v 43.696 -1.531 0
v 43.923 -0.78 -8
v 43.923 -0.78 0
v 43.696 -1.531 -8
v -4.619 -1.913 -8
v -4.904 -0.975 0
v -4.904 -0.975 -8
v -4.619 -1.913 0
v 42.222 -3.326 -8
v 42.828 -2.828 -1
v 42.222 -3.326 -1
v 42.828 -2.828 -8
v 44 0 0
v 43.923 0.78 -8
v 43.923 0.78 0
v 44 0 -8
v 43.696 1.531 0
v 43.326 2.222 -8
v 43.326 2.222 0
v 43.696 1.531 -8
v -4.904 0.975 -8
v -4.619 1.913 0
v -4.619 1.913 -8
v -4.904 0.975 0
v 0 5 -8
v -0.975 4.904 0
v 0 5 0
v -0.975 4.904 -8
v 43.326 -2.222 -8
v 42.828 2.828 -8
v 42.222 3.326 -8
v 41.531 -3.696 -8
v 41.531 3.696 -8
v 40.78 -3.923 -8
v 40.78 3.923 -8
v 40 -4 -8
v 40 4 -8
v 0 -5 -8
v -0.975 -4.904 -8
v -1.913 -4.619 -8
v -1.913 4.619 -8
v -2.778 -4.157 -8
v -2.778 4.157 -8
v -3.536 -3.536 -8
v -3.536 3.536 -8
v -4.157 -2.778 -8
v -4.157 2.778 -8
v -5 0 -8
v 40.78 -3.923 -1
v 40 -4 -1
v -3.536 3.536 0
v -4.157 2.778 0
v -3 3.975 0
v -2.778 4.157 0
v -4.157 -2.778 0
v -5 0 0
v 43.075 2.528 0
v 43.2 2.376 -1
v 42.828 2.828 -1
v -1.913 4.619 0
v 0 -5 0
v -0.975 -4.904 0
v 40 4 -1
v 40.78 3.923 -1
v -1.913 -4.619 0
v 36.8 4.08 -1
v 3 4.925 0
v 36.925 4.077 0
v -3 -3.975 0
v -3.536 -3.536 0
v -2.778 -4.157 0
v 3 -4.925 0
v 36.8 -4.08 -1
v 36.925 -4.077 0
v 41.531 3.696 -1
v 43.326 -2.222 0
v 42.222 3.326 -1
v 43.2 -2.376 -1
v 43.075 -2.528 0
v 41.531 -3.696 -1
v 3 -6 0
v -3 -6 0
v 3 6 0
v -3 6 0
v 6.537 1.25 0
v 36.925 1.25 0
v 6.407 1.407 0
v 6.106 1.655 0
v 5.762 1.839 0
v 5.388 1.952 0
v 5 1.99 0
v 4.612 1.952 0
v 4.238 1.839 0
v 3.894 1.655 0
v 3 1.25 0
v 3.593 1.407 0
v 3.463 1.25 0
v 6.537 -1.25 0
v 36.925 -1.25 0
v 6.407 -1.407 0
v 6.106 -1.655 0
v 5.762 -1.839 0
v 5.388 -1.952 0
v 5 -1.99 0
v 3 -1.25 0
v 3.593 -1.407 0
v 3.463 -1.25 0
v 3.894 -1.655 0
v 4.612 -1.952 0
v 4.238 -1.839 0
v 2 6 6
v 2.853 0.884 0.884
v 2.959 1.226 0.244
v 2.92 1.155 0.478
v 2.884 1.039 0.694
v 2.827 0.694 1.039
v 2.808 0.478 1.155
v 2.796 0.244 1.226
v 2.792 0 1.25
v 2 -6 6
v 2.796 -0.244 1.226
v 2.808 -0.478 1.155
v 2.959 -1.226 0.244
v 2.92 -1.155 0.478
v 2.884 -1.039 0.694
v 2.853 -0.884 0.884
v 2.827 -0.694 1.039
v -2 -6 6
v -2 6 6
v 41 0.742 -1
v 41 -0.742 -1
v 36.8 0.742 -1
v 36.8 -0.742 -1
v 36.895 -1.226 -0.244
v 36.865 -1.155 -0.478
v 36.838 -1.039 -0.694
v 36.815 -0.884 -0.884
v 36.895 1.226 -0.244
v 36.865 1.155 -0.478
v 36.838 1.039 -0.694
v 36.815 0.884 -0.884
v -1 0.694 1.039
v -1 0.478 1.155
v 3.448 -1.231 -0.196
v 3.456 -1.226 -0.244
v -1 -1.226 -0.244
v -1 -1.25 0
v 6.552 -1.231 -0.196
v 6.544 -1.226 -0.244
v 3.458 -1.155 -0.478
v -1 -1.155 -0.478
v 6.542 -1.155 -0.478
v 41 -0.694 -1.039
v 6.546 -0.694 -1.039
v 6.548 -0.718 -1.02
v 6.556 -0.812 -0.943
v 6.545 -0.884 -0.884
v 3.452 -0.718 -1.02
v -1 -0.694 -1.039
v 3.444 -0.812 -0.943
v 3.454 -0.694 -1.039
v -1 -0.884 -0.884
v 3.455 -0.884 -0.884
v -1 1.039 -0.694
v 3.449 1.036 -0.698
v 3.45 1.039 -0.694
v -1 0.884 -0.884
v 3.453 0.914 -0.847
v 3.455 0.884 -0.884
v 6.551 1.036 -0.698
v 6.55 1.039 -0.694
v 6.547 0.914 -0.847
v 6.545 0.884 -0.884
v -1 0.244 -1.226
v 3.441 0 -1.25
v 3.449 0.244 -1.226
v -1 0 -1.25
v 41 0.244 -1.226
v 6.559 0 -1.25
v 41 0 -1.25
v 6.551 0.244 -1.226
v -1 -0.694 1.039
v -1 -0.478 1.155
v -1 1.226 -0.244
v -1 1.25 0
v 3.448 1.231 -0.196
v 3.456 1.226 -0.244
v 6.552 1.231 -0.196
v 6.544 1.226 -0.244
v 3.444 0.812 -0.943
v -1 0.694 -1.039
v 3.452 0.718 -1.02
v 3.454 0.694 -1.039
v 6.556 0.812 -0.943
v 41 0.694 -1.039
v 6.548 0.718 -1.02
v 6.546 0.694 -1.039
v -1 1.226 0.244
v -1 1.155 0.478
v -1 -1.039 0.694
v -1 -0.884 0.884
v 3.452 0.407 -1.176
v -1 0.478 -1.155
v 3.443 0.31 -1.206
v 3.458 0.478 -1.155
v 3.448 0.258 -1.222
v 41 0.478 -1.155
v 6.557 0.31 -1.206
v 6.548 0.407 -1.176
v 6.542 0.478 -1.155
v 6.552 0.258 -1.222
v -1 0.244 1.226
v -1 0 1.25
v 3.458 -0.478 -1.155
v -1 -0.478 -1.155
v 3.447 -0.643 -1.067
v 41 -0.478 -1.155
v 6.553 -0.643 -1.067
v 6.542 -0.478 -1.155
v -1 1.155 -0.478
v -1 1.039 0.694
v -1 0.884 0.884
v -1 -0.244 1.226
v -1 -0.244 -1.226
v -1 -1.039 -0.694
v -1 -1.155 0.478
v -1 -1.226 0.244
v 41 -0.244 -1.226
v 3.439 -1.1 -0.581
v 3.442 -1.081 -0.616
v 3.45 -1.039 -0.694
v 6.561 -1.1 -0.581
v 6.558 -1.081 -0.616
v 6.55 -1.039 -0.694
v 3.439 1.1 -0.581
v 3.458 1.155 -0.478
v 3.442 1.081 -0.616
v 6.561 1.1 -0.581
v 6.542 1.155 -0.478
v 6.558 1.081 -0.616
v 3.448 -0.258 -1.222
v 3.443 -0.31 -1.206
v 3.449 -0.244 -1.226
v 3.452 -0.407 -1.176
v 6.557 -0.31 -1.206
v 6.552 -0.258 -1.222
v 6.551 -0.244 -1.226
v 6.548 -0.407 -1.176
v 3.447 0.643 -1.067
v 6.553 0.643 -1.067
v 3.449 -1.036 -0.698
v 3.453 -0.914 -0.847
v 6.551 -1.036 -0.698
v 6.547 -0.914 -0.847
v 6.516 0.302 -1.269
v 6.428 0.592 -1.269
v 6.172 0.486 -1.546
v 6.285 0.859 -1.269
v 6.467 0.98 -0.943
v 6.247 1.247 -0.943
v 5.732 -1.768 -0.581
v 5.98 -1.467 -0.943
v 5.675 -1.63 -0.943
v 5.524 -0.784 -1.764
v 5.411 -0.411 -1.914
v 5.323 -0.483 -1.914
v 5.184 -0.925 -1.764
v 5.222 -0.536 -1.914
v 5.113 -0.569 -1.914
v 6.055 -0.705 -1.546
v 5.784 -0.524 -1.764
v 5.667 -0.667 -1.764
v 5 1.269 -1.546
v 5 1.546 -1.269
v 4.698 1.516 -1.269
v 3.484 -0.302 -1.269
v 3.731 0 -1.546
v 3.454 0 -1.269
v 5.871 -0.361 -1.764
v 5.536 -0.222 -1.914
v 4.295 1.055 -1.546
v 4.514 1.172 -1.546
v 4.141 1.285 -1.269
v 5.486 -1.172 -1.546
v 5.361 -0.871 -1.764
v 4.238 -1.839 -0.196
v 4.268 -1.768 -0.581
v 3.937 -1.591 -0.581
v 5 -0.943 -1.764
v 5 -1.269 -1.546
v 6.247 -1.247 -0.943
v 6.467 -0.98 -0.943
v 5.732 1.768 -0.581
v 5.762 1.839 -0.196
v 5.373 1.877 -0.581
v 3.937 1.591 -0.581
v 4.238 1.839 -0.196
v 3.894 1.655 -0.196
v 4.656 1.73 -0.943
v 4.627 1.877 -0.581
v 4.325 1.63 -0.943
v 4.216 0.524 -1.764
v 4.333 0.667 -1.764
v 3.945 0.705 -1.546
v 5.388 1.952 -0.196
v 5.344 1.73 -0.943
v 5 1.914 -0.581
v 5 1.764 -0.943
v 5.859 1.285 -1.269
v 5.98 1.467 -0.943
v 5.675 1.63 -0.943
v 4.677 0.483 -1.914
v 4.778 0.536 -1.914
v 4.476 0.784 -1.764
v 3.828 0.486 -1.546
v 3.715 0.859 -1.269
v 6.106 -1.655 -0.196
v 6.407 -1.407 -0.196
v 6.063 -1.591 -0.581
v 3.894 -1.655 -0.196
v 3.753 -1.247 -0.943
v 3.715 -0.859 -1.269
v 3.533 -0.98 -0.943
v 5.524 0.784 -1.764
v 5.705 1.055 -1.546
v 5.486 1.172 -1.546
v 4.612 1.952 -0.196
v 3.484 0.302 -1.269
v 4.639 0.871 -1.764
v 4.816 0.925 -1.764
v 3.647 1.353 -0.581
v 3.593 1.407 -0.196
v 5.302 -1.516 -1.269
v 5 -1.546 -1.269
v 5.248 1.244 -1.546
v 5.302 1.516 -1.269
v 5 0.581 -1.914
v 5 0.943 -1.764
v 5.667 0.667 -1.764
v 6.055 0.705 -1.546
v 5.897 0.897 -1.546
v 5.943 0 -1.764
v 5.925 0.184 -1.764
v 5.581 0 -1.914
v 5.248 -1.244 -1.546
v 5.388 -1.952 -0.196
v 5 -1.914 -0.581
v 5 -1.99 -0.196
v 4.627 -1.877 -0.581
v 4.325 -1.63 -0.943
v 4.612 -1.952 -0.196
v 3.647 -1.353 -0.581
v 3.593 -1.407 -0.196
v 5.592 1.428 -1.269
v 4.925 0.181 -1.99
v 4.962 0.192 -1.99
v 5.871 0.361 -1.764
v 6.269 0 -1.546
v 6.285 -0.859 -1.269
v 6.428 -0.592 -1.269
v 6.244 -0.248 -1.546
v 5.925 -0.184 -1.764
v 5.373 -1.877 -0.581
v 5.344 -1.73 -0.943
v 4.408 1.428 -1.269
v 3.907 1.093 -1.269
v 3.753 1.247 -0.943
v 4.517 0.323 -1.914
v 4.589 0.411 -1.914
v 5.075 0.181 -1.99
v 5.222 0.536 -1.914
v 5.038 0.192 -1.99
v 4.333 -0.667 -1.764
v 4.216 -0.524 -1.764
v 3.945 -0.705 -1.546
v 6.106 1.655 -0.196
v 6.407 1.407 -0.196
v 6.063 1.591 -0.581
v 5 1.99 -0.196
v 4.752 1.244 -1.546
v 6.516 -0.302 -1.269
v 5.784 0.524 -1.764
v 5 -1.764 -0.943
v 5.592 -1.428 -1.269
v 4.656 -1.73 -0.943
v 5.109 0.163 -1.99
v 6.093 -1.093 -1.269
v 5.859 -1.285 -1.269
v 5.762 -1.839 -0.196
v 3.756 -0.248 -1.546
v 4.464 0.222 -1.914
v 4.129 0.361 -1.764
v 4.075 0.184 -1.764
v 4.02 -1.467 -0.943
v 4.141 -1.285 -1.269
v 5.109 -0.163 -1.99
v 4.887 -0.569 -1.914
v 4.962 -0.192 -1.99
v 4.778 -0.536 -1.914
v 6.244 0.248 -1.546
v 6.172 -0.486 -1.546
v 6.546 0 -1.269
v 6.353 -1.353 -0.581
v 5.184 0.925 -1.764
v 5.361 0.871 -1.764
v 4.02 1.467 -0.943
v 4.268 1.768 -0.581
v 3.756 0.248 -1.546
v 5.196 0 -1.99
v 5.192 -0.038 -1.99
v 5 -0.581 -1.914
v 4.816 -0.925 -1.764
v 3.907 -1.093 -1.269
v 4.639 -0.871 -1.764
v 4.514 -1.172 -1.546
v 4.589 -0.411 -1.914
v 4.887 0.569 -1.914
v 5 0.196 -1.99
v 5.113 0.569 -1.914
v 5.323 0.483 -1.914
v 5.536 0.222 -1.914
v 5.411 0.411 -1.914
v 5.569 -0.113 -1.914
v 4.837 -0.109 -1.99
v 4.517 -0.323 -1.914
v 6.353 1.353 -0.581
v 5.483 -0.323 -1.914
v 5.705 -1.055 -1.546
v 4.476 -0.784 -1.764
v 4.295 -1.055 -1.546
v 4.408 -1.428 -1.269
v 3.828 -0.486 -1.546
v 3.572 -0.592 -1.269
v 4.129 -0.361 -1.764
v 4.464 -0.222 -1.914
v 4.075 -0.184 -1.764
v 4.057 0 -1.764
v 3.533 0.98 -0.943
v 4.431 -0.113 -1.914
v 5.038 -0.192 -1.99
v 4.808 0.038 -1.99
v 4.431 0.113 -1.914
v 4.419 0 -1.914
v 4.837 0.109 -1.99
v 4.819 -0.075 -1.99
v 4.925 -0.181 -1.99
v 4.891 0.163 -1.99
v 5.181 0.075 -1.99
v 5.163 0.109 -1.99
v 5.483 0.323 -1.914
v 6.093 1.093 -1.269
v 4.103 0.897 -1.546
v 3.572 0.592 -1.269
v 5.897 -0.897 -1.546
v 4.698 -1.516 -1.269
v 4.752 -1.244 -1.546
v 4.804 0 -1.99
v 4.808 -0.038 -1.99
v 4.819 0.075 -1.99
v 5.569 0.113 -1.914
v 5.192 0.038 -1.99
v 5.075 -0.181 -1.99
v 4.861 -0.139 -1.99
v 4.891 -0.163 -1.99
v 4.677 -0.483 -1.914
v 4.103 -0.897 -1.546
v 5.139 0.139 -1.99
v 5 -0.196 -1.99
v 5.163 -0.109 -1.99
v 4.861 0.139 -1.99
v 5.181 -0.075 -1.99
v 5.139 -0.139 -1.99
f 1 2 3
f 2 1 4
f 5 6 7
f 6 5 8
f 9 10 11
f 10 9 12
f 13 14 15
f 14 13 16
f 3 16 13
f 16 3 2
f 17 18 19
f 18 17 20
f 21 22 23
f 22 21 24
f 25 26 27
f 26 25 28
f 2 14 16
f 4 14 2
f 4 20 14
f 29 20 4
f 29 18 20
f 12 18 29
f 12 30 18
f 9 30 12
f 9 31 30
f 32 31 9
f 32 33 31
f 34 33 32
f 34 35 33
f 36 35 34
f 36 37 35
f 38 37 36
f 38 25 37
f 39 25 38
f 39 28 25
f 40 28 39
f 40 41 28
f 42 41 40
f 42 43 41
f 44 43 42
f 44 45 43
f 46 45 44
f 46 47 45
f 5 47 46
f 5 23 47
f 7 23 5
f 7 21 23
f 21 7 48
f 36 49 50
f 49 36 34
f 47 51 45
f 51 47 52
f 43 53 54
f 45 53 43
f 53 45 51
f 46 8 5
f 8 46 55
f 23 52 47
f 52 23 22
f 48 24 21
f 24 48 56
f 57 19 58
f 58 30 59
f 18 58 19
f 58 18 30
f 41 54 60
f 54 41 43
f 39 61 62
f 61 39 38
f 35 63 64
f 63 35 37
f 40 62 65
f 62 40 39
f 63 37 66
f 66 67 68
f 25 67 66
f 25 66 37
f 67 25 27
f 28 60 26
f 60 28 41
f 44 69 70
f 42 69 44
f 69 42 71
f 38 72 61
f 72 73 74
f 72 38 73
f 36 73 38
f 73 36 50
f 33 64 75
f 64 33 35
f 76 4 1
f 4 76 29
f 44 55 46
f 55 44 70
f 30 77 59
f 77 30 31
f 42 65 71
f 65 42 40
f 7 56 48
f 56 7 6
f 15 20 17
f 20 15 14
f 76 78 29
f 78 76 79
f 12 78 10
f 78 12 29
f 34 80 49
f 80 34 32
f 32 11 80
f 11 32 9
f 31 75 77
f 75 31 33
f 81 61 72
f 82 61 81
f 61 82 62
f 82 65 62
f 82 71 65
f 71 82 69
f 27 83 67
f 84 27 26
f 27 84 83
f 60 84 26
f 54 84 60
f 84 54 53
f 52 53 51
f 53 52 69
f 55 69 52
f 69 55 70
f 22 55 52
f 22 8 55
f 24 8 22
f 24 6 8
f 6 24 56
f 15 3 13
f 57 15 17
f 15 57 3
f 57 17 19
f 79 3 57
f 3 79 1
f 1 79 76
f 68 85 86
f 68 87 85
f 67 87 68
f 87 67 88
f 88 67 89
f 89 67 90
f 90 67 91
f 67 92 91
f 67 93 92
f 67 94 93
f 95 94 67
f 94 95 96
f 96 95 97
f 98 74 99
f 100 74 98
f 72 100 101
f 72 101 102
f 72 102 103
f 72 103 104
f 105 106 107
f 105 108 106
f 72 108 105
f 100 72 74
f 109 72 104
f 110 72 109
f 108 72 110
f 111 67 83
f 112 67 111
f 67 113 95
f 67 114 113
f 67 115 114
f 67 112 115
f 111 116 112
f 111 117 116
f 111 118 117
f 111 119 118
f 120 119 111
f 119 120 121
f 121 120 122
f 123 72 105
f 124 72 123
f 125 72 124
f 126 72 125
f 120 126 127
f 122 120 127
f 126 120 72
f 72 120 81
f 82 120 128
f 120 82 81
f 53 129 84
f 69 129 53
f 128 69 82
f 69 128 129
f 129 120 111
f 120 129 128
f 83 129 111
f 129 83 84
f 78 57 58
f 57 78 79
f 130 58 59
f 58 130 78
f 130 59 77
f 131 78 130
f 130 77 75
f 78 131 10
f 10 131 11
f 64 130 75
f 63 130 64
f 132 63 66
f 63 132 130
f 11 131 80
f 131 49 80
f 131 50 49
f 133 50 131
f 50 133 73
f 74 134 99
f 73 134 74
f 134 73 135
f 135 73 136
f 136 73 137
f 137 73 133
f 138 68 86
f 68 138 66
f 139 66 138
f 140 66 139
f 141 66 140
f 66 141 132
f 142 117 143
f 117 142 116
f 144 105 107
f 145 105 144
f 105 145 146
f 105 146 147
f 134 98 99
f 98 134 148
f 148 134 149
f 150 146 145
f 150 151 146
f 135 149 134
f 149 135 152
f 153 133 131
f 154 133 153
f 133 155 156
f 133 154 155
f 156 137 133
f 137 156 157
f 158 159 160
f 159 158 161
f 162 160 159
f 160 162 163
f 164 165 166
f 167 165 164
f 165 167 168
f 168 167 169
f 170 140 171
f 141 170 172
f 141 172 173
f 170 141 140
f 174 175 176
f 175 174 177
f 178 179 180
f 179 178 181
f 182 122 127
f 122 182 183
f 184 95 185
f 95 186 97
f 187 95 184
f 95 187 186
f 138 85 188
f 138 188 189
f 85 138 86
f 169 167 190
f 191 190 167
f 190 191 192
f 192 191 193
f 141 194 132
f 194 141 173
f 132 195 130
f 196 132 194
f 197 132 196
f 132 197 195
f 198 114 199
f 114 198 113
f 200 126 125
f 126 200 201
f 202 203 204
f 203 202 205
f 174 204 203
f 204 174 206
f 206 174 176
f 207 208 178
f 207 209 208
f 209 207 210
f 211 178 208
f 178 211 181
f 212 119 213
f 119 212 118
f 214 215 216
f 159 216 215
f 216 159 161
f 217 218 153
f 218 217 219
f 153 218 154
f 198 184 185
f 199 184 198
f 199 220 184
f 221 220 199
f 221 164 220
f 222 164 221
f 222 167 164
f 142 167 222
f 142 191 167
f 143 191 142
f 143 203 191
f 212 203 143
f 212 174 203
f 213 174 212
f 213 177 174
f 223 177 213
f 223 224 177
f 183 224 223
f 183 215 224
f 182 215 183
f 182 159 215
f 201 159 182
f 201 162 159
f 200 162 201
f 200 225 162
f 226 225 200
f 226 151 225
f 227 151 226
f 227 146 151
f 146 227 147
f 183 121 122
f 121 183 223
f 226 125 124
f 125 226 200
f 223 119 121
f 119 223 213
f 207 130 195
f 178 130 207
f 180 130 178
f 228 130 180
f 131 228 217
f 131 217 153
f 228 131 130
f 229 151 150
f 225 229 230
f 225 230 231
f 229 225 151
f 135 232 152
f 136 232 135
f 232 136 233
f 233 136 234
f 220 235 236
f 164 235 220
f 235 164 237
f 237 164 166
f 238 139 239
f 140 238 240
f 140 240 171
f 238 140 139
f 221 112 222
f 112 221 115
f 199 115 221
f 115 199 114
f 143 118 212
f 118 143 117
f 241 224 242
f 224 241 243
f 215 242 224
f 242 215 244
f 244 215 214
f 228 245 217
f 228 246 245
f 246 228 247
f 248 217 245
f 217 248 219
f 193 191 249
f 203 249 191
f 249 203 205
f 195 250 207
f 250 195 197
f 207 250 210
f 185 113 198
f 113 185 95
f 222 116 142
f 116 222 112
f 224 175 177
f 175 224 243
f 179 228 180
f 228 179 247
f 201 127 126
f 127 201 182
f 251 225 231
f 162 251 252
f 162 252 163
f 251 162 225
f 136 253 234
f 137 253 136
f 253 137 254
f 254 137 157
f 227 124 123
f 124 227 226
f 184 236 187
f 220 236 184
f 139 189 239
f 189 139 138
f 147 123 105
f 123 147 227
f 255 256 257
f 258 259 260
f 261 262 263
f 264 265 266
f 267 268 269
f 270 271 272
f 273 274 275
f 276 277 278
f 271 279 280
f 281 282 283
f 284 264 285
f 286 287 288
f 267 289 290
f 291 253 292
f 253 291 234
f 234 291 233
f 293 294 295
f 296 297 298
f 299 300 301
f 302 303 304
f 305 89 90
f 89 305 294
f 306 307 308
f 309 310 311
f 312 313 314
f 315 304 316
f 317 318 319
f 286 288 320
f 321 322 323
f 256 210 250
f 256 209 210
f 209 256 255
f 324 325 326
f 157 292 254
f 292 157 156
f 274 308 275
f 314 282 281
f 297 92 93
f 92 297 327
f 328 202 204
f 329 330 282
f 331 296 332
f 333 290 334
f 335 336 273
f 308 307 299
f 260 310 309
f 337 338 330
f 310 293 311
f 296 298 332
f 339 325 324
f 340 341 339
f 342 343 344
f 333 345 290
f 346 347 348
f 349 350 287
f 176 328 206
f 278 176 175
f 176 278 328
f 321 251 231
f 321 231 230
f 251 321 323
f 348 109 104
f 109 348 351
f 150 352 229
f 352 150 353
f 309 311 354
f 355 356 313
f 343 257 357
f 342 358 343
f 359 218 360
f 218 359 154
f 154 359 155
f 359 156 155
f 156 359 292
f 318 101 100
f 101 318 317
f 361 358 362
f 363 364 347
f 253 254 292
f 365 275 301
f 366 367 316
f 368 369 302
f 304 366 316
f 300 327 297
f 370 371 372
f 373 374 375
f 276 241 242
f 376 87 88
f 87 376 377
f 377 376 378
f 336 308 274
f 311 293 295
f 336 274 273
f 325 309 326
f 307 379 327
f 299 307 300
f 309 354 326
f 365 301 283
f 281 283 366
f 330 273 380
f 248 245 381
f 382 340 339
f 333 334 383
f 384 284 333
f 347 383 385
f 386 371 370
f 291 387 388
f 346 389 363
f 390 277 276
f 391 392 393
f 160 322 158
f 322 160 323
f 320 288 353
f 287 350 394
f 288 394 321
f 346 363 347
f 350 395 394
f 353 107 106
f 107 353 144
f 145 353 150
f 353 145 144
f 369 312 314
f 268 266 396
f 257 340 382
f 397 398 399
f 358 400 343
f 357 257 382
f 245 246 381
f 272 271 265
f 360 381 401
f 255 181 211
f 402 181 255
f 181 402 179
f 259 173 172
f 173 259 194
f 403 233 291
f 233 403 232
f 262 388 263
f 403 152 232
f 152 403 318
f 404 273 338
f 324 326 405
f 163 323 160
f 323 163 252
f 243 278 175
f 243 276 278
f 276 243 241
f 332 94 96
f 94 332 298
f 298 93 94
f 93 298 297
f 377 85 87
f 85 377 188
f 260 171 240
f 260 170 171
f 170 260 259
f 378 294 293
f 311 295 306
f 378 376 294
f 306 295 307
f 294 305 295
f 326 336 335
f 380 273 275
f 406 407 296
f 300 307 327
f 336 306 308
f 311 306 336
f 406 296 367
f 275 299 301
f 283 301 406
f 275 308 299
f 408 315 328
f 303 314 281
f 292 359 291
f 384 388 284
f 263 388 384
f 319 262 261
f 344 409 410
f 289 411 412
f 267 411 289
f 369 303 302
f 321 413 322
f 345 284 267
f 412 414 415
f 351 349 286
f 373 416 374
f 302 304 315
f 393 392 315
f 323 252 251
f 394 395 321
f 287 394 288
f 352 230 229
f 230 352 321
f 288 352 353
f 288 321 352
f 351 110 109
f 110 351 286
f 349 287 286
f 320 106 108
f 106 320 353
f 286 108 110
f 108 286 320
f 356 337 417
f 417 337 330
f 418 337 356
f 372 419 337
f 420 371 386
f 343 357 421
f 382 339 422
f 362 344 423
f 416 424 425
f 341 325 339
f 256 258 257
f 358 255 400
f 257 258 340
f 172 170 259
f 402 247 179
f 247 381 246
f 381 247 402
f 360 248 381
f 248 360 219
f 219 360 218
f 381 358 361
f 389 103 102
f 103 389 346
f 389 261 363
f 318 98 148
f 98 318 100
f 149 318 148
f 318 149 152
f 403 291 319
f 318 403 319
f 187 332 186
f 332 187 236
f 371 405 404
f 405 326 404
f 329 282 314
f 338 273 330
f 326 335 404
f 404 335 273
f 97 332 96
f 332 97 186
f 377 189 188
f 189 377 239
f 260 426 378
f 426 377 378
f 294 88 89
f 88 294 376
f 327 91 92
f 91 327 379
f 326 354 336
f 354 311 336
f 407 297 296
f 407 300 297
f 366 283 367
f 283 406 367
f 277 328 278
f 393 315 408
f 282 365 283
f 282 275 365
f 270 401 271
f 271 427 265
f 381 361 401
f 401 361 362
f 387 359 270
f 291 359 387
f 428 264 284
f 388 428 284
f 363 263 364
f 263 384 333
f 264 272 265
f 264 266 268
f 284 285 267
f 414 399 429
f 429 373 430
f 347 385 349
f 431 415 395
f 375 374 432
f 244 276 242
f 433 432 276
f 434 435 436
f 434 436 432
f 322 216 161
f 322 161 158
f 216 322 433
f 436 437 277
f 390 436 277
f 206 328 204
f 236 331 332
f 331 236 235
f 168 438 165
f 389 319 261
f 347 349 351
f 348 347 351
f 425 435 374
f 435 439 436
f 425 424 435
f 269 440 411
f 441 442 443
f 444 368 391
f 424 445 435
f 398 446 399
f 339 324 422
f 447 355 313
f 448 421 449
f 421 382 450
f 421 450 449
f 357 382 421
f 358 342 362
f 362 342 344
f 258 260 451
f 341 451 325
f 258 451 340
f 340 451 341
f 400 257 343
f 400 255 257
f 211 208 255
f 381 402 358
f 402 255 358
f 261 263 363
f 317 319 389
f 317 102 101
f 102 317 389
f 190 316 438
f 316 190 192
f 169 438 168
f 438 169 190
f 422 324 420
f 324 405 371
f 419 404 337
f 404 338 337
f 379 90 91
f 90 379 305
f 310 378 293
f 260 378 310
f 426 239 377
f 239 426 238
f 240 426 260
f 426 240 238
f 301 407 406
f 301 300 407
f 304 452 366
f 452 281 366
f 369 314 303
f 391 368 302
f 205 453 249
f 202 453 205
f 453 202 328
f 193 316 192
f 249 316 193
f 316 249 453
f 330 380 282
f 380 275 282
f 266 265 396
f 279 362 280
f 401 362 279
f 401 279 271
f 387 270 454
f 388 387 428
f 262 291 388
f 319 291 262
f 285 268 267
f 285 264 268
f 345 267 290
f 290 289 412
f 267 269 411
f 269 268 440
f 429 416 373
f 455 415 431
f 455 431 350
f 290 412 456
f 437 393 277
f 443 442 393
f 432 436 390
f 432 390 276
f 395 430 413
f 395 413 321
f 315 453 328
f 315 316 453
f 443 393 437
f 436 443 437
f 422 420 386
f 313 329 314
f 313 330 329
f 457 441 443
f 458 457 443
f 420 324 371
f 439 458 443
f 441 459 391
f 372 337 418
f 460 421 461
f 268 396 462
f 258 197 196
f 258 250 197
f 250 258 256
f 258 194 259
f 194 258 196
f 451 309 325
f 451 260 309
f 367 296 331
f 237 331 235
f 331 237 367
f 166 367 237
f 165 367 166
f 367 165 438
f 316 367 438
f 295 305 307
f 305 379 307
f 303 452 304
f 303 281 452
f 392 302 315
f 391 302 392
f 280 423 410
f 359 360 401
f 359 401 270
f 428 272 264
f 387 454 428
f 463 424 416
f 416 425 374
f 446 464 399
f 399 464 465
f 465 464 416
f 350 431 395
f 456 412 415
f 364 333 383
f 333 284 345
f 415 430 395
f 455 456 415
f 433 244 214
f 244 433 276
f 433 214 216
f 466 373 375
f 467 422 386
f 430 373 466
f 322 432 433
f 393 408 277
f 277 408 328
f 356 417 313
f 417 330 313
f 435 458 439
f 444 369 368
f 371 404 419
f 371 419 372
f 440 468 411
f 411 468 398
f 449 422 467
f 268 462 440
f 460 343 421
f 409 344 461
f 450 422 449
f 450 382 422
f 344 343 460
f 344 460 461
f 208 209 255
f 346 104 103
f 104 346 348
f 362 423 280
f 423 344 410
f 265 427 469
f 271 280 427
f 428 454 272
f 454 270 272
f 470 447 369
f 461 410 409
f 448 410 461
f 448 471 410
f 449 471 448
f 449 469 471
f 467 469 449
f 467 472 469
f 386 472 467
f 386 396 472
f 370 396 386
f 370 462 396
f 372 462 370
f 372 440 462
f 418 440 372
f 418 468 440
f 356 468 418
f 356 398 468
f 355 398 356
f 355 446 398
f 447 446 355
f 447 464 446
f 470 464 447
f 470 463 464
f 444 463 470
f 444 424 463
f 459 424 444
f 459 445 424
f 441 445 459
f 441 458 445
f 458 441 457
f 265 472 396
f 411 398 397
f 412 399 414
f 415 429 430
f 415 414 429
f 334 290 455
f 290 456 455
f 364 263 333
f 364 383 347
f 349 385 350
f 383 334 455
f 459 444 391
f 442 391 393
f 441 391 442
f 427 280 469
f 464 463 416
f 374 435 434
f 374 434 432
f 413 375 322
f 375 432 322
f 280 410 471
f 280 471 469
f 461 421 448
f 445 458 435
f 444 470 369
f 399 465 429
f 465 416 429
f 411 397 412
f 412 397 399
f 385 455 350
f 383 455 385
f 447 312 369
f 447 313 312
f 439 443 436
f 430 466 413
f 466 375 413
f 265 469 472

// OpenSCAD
// COBRA-Snap Finger Segment - middle
// Dovetail slide joints, no glue needed

$fn = 32;

module finger_segment() {
    difference() {
        union() {
            // Main body
            hull() {
                translate([0, 0, -4])
                cylinder(h=8, d=10, center=true);
                
                translate([40.0, 0, -4])
                cylinder(h=8, d=8.0, center=true);
            }
            
            // Male dovetail (proximal end)
            translate([0, 0, 0])
            rotate([90, 0, 0])
            linear_extrude(height=12, center=true)
            polygon(points=[[-3, 0], [3, 0], [2, 6], [-2, 6]]);
        }
        
        // Female dovetail socket (distal end) - skip for distal
        
        translate([40.0, 0, 0])
        rotate([90, 0, 0])
        linear_extrude(height=10.0, center=true)
        polygon(points=[[-3.2, -1], [3.2, -1], [2.2, 7], [-2.2, 7]]);
        
        
        // Tendon channel
        translate([20.0, 0, 0])
        rotate([0, 90, 0])
        cylinder(h=42.0, d=2.5, center=true);
        
        // Quick-connect socket for tendon
        translate([5, 0, 0])
        sphere(d=4);
    }
}

finger_segment();
